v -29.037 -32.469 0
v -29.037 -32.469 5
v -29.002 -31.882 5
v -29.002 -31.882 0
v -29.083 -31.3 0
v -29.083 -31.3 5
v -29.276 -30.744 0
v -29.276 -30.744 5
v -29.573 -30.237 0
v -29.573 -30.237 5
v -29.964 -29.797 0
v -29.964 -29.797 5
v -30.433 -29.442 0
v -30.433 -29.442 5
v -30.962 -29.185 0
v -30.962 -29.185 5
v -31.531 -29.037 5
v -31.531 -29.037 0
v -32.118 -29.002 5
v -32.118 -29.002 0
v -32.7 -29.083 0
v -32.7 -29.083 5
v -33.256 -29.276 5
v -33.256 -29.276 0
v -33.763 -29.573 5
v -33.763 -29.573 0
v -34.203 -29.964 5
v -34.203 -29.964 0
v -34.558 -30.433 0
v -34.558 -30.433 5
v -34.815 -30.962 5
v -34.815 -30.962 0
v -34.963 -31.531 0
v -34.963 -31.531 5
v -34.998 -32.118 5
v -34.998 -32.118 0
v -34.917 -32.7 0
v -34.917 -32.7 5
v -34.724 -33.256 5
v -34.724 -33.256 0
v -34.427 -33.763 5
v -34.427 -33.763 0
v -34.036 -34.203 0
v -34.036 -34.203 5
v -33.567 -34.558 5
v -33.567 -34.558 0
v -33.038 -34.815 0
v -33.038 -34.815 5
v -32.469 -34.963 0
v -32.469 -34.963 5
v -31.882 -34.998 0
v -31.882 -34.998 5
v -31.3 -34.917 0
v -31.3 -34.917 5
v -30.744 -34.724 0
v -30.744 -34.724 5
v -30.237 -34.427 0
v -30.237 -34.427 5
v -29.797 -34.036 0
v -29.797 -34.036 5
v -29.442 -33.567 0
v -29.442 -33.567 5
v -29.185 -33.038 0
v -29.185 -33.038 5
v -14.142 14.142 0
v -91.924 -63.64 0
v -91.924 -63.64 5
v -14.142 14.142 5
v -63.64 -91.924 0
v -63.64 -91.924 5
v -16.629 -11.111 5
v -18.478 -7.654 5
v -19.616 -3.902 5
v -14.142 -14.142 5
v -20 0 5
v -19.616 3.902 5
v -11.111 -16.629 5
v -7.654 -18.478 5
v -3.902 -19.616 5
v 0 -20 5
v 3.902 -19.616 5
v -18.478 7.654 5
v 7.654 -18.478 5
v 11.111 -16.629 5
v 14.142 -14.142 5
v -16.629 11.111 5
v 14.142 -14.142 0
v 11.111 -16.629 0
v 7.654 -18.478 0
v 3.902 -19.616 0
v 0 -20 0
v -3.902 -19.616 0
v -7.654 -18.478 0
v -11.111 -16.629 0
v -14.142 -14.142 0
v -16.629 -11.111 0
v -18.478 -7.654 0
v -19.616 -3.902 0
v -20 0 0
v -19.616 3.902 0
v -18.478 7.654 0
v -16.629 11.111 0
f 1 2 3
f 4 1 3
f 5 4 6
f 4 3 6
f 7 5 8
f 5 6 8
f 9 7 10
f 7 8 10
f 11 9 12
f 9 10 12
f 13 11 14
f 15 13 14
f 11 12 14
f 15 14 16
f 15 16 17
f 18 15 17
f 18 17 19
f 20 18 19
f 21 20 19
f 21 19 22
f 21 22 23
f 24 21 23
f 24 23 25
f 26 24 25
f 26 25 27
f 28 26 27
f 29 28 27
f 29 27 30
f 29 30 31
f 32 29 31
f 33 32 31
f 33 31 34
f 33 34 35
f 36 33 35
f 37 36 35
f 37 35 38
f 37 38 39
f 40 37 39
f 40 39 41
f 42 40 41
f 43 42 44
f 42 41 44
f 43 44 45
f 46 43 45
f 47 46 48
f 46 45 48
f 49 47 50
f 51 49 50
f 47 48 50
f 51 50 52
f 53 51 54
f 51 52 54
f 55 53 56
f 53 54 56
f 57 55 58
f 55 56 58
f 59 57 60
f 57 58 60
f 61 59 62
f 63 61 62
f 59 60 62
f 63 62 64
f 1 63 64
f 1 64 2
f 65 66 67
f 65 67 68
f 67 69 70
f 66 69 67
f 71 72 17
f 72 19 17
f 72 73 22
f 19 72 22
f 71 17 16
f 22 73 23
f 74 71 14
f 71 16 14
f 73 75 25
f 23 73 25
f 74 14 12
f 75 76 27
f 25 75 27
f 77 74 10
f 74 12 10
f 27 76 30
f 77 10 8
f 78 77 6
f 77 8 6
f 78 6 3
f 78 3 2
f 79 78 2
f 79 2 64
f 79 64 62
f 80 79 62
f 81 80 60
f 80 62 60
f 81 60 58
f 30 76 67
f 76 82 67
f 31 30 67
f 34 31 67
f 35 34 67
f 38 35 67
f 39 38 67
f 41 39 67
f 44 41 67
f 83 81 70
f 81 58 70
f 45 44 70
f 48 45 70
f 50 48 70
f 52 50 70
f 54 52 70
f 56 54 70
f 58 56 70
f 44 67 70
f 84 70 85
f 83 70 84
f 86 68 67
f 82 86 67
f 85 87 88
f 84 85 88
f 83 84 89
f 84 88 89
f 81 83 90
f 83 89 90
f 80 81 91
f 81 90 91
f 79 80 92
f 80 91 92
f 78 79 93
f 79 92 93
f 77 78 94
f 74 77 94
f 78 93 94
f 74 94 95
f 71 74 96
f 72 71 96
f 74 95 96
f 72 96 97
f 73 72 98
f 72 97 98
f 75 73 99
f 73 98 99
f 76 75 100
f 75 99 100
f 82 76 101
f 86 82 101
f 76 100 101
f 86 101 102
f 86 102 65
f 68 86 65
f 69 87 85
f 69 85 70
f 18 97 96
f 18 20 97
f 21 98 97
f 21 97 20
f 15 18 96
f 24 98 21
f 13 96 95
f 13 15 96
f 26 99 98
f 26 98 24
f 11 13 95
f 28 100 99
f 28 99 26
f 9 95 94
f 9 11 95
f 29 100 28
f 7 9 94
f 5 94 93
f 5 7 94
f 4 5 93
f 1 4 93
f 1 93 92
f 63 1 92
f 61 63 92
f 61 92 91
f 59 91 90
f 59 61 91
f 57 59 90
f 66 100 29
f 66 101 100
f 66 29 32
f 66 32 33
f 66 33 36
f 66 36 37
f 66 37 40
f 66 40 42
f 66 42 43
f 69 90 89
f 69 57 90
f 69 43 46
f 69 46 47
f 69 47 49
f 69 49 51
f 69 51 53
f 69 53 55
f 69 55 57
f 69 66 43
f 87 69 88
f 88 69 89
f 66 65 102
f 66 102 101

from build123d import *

# Parameters (mm, degrees)
SKETCH010_AS_DRAWN_R                      = 3
EXTRUDE009_DEPTH                          = 40
EXTRUDE009_ONTO_SKETCH010_PLACEMENT_ANGLE = 9
EXTRUDE001_DEPTH                          = 5
EXTRUDE001_PLACEMENT_ANGLE                = 45


with BuildPart() as extrude009:
    # Sketch010 as drawn → Extrude009 (new)
    with BuildSketch(Plane.XY):
        Circle(SKETCH010_AS_DRAWN_R)
    extrude(amount=-EXTRUDE009_DEPTH)


with BuildPart() as extrude009_1:
    # Extrude009 onto Sketch010 placement: moved
    add(extrude009.part.moved(Location((-32, -32, 30))).rotate(Axis((-32, -32, 30), (0, 0, -1)), EXTRUDE009_ONTO_SKETCH010_PLACEMENT_ANGLE))


with BuildPart() as cut003:
    # Sketch001 (on Face7 of Extrude) → Extrude001 (new body)
    with BuildSketch(Plane(origin=(0, 0, 0), x_dir=(1, 0, 0), z_dir=(0, 0, -1))):
        with BuildLine():
            Line((20, 0), (20, 110))
            Line((20, 110), (-20, 110))
            Line((-20, 110), (-20, 0))
            ThreePointArc((20, 0), (0, 20), (-20, 0))
        make_face()
    extrude(amount=-EXTRUDE001_DEPTH)


with BuildPart() as cut003_1:
    # Extrude001 placement: moved
    add(cut003.part.rotate(Axis((0, 0, 0), (0, 0, -1)), EXTRUDE001_PLACEMENT_ANGLE))

    # Cut003: cut Extrude009
    add(extrude009_1.part, mode=Mode.SUBTRACT)


solid = cut003_1.part
